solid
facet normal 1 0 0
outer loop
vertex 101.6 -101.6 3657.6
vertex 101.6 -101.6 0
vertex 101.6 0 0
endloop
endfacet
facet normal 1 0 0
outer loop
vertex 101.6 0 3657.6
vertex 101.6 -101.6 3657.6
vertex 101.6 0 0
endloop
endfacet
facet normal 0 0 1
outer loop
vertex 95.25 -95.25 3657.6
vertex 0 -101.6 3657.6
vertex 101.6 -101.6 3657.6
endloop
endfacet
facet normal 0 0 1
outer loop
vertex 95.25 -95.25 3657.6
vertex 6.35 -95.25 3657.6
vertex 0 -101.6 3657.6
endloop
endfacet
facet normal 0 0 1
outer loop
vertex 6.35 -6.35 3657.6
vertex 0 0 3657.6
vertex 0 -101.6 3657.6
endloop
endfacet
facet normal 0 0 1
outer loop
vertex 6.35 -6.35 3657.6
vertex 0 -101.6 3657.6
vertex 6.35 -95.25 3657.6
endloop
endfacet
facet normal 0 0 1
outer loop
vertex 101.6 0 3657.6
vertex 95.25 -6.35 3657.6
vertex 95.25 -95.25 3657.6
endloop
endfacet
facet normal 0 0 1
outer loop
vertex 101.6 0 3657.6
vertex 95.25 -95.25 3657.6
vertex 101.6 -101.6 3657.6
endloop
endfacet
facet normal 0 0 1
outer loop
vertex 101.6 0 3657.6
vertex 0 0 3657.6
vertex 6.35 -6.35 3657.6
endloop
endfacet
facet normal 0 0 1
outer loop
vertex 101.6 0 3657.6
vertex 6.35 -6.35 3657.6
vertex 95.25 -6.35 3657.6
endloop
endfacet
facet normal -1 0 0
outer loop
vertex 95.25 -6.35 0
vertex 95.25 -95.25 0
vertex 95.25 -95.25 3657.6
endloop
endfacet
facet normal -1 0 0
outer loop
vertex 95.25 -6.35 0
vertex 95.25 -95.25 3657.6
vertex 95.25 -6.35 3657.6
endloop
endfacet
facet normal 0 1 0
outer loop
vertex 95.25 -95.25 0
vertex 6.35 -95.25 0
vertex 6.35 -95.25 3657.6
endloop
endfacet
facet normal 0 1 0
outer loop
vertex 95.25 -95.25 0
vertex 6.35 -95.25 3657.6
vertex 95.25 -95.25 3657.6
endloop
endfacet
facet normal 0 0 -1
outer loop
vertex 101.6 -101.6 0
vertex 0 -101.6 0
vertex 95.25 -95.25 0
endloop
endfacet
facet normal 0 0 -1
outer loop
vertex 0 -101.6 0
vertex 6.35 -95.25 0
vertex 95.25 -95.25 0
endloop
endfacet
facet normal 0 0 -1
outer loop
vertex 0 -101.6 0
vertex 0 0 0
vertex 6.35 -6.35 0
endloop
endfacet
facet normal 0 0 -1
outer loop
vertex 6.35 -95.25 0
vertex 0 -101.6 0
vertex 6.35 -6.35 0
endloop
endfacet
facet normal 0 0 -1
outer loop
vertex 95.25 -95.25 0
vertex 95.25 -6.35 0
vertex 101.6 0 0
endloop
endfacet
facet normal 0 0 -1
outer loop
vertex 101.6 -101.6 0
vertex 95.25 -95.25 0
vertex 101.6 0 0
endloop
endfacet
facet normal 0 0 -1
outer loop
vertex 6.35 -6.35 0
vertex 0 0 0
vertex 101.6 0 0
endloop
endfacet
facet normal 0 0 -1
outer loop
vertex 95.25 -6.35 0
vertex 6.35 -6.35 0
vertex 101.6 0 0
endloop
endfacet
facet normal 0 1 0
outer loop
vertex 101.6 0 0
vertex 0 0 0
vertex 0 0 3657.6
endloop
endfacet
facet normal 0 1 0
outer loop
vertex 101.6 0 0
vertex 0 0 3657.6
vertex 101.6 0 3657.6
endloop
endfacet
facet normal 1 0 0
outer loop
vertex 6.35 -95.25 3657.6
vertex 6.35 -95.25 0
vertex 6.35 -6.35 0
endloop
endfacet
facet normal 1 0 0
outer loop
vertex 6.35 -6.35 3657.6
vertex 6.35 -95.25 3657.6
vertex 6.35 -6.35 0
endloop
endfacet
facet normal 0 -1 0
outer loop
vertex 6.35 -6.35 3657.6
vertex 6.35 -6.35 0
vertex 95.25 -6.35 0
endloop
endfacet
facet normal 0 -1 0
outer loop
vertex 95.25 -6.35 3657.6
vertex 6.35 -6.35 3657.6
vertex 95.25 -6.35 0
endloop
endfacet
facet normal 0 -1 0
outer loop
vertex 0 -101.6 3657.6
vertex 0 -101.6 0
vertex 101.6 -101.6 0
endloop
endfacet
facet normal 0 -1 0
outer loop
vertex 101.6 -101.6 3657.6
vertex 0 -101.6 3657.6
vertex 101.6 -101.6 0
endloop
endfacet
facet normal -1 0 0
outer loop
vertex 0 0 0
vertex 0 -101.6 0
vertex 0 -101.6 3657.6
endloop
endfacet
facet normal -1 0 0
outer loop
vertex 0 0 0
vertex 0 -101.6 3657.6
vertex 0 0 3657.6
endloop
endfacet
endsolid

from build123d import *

# Parameters (mm, degrees)
F0_W      = 101.6
F0_H      = 101.6
F1_DEPTH  = 3657.6
F2_W      = 88.9
F2_H      = 88.9
F3_DEPTH  = 3657.6
F4_W      = 88.9
F4_H      = 88.9
F5_DEPTH  = 254
F6_W      = 88.9
F6_H      = 88.9
F7_DEPTH  = 254
F9_W      = 101.6
F9_H      = 112.826722
F10_DEPTH = 3251.2


with BuildPart() as f1:
    # F0 (on Top) → F1 (new body)
    with BuildSketch(Plane.XY):
        with Locations((50.8, -50.8)):
            Rectangle(F0_W, F0_H)
    extrude(amount=F1_DEPTH)

    # F2 (on face) → F3 (cut)
    with BuildSketch(Plane.XY.offset(3657.6)):
        with Locations((50.8, -50.8)):
            Rectangle(F2_W, F2_H)
    extrude(amount=-F3_DEPTH, mode=Mode.SUBTRACT)


with BuildPart() as f5:
    # F4 (on face) → F5 (new body)
    with BuildSketch(Plane.XY.offset(3657.6)):
        with Locations((50.8, -50.8)):
            Rectangle(F4_W, F4_H)
    extrude(amount=F5_DEPTH)

    # F6 (on face) → F7 (join)
    with BuildSketch(Plane.YZ.offset(95.25)):
        with Locations((-50.8, 3867.15)):
            Rectangle(F6_W, F6_H)
    extrude(amount=F7_DEPTH)


with BuildPart() as f5_1:
    # F8: moved
    add(f5.part.moved(Location((0, 0, -152.4))))

    # F9 (on face) → F10 (join)
    with BuildSketch(Plane.YZ.offset(349.25)):
        with Locations((-50.8, 3714.75)):
            Rectangle(F9_W, F9_H)
    extrude(amount=F10_DEPTH)


solid = f1.part
